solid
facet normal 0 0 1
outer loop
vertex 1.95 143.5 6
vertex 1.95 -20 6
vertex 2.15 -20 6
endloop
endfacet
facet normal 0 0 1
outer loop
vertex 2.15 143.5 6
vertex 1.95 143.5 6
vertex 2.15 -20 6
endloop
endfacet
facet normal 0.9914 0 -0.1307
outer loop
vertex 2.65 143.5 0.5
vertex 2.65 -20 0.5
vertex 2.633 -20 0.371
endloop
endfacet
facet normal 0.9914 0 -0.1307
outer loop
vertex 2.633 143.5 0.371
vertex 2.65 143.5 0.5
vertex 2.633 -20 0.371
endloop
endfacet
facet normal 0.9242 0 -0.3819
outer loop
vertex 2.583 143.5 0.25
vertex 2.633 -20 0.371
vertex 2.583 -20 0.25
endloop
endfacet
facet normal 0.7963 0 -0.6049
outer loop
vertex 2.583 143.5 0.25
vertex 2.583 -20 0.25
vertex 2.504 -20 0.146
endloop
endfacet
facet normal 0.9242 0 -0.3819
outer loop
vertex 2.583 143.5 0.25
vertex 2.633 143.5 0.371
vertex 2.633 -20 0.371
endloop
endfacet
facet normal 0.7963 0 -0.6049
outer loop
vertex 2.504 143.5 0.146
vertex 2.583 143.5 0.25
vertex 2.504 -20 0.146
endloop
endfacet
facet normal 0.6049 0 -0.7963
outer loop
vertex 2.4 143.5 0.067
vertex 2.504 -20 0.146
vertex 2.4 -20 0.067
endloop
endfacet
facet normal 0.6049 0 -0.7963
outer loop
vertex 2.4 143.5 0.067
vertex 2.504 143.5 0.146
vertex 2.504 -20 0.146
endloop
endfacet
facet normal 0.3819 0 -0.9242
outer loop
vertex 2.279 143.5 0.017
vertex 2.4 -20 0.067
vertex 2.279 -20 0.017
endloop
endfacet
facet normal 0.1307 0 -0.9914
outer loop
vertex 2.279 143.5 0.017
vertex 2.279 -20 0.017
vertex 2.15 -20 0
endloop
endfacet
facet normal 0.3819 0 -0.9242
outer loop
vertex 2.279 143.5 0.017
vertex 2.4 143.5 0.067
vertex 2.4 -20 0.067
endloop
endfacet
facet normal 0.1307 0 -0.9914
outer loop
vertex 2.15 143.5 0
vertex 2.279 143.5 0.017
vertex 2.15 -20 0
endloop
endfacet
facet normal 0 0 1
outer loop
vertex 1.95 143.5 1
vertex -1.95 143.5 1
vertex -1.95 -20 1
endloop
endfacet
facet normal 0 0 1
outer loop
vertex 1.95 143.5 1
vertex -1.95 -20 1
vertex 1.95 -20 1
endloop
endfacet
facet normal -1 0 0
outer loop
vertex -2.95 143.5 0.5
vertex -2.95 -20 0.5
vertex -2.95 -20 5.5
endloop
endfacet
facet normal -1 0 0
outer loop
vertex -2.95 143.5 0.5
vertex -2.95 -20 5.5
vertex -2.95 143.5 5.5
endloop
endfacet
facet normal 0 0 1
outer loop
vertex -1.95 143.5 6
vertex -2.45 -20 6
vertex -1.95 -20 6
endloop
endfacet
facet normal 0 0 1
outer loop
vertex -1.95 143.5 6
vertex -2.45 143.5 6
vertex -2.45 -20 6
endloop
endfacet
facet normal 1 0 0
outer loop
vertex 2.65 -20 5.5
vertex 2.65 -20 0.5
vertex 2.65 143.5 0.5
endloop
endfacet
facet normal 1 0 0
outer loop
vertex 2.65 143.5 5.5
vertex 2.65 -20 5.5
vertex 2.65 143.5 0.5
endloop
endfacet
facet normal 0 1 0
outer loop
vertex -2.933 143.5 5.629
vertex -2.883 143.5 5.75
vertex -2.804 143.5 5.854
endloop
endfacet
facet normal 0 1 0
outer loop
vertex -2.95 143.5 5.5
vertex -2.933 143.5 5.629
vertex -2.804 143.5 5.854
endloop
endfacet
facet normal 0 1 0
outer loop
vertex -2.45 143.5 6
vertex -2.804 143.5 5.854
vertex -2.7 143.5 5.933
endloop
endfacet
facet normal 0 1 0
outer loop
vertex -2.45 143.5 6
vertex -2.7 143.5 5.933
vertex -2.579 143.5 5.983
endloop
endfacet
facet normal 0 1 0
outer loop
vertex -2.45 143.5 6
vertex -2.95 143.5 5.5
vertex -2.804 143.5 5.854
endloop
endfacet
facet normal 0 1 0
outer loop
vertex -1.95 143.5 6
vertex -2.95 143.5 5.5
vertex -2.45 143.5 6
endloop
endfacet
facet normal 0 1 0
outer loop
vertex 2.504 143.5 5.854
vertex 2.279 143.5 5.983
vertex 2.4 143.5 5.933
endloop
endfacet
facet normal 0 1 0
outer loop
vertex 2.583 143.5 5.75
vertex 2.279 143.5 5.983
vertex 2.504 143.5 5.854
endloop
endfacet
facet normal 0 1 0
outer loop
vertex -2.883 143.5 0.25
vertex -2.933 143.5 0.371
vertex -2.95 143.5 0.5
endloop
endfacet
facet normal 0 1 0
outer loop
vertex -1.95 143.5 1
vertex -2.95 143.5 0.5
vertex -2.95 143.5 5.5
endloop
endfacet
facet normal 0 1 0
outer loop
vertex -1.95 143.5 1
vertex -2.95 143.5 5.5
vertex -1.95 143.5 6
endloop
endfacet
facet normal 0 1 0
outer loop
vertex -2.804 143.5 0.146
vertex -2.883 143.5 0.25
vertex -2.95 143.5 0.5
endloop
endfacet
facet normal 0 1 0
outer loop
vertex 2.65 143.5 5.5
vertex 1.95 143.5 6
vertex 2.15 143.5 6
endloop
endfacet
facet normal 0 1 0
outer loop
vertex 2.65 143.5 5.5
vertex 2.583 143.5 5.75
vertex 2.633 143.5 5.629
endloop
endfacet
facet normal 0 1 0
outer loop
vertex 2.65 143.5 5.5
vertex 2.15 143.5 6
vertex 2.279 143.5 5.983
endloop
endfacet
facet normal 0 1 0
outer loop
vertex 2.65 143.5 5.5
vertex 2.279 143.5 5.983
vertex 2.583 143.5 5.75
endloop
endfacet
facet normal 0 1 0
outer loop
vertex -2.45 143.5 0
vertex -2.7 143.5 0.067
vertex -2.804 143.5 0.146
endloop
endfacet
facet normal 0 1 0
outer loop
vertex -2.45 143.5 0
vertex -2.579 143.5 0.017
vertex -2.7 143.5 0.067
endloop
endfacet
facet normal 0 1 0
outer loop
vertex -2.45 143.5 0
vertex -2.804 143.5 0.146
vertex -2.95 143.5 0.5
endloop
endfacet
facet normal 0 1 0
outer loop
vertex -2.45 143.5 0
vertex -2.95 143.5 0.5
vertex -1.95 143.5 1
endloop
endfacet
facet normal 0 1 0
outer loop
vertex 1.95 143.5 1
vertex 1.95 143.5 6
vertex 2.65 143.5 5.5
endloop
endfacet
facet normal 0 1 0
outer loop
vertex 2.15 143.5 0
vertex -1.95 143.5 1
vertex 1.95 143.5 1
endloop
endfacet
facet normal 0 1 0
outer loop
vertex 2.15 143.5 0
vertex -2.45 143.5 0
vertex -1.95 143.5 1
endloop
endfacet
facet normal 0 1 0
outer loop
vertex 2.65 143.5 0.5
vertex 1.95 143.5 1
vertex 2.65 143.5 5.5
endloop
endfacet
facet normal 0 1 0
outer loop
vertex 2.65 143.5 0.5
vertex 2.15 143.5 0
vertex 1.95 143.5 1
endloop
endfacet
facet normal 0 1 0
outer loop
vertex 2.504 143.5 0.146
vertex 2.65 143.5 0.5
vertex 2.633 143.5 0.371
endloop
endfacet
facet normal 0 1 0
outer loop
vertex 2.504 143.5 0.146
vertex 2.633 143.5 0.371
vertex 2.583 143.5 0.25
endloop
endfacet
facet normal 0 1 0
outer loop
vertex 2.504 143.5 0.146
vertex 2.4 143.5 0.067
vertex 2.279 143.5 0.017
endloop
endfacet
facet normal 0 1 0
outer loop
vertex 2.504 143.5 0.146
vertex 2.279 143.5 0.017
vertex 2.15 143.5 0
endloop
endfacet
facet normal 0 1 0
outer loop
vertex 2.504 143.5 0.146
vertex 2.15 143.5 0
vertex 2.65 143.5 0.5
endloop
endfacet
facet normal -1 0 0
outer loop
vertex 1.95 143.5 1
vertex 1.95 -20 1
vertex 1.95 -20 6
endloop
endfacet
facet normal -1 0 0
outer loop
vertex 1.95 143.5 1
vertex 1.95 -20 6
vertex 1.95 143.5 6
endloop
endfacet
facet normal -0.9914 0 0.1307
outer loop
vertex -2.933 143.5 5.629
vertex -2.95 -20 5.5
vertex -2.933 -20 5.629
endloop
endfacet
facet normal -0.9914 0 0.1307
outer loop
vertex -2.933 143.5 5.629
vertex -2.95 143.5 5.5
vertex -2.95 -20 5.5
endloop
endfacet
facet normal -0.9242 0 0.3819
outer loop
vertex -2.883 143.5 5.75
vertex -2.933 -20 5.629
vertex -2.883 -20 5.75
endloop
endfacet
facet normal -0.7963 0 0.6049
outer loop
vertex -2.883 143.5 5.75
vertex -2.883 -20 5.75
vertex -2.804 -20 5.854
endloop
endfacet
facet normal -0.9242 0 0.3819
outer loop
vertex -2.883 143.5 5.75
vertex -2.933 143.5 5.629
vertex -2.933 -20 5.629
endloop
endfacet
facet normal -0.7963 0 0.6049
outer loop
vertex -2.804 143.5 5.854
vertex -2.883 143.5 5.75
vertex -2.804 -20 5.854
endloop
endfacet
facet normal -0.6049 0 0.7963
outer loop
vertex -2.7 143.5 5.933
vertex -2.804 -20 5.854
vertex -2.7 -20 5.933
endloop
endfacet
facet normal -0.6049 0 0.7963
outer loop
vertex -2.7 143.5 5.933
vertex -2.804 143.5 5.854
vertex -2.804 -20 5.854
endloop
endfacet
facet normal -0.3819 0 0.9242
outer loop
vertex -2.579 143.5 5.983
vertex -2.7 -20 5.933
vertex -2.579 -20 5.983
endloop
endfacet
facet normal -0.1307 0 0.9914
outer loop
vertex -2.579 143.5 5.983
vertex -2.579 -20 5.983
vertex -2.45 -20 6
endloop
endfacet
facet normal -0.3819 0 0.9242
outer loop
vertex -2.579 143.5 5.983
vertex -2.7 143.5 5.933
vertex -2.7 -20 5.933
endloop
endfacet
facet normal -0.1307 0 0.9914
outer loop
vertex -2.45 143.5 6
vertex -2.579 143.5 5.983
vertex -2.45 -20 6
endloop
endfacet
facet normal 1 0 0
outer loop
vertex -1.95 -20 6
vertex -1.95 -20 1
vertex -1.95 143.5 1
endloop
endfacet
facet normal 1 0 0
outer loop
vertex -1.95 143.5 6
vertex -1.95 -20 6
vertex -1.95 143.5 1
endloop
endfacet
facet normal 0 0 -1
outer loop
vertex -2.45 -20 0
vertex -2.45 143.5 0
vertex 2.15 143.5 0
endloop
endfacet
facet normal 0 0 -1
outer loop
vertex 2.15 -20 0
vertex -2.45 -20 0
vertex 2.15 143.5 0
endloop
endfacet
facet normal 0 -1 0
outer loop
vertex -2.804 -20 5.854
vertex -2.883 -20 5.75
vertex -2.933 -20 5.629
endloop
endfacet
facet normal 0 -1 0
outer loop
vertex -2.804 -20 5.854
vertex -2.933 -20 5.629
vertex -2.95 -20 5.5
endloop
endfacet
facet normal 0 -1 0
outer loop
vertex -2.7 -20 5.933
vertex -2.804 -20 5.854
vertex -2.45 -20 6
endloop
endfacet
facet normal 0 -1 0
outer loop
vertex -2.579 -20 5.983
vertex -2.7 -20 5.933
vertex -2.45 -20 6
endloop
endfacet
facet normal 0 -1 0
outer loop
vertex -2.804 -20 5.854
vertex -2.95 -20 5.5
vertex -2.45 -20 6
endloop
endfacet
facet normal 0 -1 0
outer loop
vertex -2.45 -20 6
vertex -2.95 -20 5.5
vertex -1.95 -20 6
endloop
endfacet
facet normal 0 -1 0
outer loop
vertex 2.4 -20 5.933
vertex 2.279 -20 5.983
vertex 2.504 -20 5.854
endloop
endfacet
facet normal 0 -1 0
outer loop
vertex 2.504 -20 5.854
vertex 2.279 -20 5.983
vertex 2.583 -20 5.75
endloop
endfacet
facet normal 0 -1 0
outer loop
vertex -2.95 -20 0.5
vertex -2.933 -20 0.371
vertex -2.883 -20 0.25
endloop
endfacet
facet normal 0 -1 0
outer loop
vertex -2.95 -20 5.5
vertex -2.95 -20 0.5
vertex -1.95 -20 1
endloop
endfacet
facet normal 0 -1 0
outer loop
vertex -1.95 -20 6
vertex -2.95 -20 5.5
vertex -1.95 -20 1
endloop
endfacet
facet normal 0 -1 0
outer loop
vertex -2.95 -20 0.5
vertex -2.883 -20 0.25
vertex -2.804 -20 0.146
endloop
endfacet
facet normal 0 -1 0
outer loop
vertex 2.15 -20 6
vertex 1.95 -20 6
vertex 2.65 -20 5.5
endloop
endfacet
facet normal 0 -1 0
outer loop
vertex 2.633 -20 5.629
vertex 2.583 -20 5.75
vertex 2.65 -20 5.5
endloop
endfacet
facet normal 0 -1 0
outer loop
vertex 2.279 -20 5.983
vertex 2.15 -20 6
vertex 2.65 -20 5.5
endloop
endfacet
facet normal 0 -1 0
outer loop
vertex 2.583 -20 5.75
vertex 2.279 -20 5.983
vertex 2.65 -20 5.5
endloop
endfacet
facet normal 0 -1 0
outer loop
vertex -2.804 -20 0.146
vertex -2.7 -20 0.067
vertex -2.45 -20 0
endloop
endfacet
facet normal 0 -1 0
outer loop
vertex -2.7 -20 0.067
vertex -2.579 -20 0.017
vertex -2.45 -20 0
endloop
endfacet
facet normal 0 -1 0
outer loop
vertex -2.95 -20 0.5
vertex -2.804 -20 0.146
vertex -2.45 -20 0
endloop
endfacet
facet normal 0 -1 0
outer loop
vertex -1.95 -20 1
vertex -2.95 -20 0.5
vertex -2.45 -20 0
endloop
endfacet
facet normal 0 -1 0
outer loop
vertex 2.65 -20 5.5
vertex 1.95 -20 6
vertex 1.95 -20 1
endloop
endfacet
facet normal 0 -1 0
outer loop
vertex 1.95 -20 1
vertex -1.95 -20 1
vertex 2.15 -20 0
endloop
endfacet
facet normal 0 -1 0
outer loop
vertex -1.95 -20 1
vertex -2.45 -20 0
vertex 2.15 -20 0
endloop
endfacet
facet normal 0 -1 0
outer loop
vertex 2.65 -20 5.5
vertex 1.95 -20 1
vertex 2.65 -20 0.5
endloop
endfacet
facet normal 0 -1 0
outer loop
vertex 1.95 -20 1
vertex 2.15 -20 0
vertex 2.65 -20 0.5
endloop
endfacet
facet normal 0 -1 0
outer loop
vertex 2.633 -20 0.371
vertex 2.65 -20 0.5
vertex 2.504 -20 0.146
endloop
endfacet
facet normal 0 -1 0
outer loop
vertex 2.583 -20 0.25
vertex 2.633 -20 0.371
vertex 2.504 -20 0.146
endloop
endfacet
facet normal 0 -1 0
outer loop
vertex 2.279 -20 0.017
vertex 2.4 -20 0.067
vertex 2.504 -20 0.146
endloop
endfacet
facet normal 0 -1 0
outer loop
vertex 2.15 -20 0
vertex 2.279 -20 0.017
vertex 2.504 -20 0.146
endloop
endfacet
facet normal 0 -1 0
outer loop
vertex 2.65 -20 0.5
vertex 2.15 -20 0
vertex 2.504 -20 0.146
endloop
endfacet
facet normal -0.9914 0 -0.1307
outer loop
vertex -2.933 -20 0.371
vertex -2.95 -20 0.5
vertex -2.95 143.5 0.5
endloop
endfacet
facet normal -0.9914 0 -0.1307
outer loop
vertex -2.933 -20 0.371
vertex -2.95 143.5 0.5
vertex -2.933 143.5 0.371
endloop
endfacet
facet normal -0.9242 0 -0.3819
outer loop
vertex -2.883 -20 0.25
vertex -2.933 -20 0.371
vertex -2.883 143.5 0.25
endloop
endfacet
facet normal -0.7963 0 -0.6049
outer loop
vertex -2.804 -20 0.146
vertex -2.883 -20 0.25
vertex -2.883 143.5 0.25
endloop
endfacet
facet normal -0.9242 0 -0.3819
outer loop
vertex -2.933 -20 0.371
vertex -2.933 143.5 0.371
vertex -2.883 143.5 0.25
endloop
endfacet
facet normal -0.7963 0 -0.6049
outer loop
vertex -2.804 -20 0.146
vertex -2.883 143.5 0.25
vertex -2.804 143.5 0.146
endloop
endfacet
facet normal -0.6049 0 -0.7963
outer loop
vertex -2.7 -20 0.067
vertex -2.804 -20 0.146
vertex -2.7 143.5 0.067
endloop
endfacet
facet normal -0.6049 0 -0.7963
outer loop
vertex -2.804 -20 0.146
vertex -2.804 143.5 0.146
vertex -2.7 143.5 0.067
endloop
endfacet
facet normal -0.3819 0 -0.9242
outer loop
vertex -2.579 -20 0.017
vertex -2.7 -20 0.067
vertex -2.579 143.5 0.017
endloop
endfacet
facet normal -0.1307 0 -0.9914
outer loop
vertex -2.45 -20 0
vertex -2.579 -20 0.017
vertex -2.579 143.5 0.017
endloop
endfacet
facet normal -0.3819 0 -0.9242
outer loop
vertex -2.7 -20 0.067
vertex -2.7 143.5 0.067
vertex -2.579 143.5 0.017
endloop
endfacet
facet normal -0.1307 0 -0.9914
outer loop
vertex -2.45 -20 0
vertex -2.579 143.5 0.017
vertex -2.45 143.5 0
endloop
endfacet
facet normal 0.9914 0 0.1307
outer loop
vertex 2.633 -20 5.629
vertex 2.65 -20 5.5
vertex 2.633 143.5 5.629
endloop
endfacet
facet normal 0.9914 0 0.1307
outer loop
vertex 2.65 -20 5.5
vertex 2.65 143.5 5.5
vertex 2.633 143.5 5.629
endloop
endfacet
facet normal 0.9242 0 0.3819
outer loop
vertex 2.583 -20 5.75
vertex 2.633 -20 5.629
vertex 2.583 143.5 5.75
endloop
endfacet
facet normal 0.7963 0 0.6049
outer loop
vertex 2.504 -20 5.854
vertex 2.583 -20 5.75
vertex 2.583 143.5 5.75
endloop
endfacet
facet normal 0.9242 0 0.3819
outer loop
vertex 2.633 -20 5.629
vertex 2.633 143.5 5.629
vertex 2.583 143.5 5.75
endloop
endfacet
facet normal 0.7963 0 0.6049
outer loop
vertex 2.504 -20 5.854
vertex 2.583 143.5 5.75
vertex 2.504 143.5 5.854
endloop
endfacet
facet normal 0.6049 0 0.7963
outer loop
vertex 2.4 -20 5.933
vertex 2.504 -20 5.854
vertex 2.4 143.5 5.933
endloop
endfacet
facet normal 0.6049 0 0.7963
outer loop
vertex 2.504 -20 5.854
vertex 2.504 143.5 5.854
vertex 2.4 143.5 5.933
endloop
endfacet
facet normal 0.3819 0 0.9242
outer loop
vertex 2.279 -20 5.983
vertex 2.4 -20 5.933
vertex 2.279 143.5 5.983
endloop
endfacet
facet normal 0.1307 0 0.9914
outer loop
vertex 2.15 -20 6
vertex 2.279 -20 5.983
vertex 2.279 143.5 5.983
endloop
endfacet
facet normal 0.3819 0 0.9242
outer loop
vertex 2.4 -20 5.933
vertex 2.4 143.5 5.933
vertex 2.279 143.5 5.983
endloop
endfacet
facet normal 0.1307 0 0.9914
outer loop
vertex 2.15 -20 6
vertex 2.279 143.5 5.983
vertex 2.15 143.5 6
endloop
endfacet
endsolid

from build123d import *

# Parameters (mm, degrees)
F0_W     = 1
F0_H     = 163.5
F1_DEPTH = 6
F0_W_2   = 0.7
F2_R     = 0.5
F2_2_R   = 0.5
F0_W_3   = 3.9
F3_DEPTH = 1


with BuildPart() as f1:
    # F0 (on Top) → F1 (new body)
    with BuildSketch(Plane.XY):
        with Locations((-2.45, 61.75)):
            Rectangle(F0_W, F0_H)
    extrude(amount=F1_DEPTH)

    # F2
    f2_edges = [f1.edges().sort_by_distance(p)[0] for p in [
        (-2.95, 61.75, 6),
        (-2.95, 61.75, 0),
    ]]
    fillet(f2_edges, radius=F2_R)



with BuildPart() as f1b:
    # F0 (on Top) → F1, piece 2 (new body)
    with BuildSketch(Plane.XY):
        with Locations((2.3, 61.75)):
            Rectangle(F0_W_2, F0_H)
    extrude(amount=F1_DEPTH)

    # F2#2
    f2_2_edges = [f1b.edges().sort_by_distance(p)[0] for p in [
        (2.65, 61.75, 6),
        (2.65, 61.75, 0),
    ]]
    fillet(f2_2_edges, radius=F2_2_R)


with BuildPart() as f1_1:
    add(f1.part)

    add(f1b.part)  # F3 merges F1b
    # F0 (on Top) → F3 (join)
    with BuildSketch(Plane.XY):
        with Locations((0, 61.75)):
            Rectangle(F0_W_3, F0_H)
    extrude(amount=F3_DEPTH)


solid = f1_1.part
